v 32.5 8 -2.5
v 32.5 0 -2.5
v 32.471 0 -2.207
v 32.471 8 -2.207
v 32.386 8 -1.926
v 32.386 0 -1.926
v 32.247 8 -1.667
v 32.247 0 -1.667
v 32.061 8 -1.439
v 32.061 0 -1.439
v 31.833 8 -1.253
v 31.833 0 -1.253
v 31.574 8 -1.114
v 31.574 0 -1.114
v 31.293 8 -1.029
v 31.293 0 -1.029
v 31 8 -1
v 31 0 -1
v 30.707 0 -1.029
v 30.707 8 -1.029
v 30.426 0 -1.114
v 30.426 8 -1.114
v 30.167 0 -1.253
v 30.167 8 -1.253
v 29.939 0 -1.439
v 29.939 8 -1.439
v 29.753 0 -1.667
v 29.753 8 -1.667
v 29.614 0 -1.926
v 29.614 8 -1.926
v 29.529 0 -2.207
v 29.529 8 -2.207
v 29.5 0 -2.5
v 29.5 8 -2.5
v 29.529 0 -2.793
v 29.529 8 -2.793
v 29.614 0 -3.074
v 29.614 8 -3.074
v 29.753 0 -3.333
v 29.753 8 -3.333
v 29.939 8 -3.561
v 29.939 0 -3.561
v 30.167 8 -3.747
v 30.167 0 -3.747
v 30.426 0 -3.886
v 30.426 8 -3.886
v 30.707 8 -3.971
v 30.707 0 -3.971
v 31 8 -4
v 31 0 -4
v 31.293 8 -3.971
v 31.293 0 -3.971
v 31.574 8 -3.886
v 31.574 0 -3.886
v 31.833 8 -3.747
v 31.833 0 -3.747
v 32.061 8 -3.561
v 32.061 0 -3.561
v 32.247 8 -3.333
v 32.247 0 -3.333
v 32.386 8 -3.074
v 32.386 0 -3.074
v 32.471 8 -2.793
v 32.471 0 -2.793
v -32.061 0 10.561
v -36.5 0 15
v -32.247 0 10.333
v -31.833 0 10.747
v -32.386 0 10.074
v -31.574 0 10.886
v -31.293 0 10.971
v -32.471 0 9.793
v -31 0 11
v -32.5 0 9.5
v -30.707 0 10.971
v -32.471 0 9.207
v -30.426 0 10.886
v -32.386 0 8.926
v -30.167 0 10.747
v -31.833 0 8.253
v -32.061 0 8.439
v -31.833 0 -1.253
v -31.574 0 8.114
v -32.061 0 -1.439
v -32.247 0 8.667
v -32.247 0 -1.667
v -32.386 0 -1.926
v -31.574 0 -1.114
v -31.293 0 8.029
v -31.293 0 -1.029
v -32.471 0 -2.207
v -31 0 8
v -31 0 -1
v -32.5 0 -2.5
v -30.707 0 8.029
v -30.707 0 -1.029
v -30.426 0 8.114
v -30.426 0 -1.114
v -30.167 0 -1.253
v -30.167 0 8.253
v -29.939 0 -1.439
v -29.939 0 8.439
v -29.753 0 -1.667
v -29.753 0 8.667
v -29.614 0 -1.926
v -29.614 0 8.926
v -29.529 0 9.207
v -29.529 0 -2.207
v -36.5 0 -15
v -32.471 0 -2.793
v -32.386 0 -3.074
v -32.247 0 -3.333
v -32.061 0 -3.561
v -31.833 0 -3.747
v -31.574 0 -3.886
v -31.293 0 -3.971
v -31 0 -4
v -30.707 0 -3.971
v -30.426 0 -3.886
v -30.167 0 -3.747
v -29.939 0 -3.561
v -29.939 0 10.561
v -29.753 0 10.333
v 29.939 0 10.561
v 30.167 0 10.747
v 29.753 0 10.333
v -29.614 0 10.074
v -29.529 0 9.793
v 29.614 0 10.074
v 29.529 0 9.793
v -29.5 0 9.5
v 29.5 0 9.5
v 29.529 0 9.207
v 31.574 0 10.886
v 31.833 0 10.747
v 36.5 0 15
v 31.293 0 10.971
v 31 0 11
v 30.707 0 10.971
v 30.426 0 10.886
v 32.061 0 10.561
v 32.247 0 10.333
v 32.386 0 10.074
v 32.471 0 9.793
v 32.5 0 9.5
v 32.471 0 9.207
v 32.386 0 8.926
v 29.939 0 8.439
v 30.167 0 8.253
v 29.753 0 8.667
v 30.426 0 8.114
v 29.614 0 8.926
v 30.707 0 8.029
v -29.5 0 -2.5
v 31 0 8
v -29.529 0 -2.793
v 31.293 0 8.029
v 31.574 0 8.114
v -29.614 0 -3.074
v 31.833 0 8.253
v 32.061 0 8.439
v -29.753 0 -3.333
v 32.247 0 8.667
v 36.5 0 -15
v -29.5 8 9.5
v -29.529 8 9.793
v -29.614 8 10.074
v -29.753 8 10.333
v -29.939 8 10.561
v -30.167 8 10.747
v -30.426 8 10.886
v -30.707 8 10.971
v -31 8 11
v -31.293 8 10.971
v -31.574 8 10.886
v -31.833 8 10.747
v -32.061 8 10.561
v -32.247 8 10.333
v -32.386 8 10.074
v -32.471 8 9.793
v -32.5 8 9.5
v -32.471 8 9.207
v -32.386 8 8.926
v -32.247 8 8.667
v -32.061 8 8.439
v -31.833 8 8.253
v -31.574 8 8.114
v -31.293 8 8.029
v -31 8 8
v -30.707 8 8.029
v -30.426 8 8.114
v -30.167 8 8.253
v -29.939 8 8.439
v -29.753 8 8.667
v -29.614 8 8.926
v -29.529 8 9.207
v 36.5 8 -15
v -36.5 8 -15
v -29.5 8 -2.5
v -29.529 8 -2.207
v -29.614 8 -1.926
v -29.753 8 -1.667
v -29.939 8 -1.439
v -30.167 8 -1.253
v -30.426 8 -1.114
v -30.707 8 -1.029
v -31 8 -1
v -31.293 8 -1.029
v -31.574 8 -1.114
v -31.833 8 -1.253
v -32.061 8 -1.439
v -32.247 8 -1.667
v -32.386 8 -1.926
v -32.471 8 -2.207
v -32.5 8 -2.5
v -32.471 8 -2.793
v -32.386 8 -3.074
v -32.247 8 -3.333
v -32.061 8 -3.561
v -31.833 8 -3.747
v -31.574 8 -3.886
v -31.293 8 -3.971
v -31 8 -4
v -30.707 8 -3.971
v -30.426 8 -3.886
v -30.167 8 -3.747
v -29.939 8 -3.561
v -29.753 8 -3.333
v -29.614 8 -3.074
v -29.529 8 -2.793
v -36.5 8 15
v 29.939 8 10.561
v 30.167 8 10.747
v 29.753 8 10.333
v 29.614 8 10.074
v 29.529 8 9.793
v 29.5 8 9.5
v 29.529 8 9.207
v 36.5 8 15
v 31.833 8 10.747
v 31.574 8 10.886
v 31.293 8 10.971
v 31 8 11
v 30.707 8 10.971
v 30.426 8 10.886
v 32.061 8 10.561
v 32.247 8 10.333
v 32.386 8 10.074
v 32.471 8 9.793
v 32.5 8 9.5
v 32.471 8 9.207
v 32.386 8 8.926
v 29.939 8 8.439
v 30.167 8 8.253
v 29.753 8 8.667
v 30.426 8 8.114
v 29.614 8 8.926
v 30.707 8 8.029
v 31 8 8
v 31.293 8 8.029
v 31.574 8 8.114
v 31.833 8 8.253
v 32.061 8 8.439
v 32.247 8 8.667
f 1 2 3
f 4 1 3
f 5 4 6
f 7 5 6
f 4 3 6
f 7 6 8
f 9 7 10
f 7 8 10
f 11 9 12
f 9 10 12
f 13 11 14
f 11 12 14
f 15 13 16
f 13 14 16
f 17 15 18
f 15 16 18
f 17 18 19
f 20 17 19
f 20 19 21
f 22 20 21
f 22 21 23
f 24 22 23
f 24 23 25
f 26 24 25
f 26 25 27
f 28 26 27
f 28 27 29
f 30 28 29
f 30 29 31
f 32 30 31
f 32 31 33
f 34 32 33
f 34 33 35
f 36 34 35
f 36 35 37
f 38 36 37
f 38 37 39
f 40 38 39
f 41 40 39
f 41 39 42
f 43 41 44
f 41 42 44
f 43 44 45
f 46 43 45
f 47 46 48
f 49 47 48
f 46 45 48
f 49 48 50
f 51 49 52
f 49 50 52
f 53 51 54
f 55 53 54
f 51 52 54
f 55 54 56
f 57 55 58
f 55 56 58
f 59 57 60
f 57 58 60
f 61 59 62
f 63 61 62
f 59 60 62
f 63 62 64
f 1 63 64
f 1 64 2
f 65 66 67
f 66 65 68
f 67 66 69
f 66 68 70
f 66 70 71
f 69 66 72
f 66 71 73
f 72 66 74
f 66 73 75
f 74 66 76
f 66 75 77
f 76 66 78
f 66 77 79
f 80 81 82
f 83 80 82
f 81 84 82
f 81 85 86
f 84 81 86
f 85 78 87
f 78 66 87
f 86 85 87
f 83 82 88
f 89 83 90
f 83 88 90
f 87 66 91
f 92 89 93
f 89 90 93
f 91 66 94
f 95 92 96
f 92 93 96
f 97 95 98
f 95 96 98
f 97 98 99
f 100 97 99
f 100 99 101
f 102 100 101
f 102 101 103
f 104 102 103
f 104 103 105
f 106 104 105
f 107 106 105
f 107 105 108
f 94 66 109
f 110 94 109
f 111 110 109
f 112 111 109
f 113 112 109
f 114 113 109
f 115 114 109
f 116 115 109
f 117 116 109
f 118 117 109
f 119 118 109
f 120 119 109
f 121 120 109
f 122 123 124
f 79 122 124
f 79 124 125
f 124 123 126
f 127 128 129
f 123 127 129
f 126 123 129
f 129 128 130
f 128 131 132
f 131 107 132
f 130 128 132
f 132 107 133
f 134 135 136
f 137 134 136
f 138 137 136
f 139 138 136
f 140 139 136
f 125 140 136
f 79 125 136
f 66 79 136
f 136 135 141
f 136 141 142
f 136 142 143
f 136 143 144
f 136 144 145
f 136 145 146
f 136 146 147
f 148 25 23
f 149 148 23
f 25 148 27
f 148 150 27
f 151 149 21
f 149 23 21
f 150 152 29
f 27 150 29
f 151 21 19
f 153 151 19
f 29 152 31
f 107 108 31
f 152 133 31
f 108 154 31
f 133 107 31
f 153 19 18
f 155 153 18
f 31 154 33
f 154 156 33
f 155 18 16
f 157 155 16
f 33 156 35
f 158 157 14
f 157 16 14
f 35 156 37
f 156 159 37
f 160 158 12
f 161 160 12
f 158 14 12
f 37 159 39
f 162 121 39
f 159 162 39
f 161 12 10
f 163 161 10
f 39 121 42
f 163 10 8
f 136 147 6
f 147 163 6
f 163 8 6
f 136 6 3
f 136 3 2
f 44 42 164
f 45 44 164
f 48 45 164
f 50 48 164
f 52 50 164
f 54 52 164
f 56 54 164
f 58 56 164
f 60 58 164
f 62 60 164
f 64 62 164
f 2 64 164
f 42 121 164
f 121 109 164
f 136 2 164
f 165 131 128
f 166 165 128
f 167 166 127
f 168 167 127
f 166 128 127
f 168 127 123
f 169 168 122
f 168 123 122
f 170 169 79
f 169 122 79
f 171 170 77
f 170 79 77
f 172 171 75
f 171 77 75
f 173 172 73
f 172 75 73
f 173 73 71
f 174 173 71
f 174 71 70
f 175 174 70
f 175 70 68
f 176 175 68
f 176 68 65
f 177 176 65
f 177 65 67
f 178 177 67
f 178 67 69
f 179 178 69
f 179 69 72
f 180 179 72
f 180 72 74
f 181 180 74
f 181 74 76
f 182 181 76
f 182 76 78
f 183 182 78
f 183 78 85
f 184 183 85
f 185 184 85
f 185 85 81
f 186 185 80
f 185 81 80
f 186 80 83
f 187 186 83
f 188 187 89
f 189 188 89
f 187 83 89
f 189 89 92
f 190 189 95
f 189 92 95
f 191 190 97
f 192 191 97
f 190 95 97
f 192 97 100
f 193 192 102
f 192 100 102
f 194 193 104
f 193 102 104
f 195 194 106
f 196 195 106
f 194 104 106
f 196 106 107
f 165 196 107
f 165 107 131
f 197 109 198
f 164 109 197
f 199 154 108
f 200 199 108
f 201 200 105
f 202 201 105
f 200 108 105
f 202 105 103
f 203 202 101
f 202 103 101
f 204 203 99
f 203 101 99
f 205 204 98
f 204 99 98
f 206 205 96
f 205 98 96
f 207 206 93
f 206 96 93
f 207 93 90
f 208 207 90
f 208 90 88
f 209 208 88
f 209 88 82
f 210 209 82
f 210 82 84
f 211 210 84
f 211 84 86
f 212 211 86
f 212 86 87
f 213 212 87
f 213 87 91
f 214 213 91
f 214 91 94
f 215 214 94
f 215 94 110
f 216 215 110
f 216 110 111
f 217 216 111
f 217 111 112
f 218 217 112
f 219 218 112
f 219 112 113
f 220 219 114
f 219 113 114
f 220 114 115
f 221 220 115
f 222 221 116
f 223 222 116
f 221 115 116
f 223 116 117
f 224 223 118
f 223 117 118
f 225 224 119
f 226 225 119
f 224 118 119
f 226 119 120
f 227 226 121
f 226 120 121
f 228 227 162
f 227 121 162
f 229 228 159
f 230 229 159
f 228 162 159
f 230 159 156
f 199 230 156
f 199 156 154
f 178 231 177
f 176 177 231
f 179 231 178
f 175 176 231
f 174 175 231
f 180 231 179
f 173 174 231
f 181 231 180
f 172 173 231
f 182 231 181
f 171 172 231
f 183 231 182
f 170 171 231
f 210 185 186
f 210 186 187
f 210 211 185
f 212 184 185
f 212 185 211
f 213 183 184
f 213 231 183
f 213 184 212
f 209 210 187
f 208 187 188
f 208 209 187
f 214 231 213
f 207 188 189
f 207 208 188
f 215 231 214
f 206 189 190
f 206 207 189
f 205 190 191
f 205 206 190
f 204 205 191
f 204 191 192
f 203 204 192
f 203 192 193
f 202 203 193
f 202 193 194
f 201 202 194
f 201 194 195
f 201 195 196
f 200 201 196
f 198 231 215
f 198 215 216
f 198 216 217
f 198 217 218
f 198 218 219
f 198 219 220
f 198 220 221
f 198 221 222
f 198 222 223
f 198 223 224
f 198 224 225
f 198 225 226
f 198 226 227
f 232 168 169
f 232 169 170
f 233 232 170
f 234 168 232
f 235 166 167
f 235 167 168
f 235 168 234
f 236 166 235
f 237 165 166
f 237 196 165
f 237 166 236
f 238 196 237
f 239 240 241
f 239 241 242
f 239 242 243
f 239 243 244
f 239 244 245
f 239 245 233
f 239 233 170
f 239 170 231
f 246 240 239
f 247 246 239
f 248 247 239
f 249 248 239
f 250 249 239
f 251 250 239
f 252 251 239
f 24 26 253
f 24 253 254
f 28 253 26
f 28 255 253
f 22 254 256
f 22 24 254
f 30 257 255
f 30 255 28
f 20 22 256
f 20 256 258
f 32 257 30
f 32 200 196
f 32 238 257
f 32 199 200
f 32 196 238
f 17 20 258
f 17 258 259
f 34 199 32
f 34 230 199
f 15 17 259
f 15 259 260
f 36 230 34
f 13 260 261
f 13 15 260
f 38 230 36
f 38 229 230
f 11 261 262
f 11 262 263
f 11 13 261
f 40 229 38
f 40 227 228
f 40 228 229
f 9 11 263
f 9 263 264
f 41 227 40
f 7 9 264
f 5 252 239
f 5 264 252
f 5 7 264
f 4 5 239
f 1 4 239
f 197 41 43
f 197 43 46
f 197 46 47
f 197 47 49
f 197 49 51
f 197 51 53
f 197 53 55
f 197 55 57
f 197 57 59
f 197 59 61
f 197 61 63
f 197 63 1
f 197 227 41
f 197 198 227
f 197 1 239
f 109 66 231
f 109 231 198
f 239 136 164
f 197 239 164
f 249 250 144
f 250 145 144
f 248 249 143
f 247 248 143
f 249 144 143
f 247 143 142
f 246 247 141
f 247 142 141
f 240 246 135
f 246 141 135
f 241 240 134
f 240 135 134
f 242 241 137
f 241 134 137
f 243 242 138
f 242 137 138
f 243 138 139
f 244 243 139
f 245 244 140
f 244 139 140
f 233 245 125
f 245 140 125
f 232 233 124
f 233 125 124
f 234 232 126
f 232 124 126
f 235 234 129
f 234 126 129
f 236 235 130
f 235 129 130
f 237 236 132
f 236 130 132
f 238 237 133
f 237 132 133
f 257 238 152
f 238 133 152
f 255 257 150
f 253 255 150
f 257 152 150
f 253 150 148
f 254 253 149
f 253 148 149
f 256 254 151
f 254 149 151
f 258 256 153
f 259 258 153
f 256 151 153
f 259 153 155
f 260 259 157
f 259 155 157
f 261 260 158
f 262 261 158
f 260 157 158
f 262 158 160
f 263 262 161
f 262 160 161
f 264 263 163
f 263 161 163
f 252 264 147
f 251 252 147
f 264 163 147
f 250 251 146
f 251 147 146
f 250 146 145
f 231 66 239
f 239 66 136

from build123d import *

# Parameters (mm, degrees)
SKETCH_1_W          = 73
SKETCH_1_H          = 30
EXTRUDE_1_DEPTH     = 8
SKETCH_2_R          = 1.5
CUT_EXTRUDE_1_DEPTH = 45


with BuildPart() as part:
    # 草图1 → 凸台-拉伸1 (new body)
    with BuildSketch(Plane(origin=(0, 0, 0), x_dir=(1, 0, 0), z_dir=(0, 1, 0))):
        Rectangle(SKETCH_1_W, SKETCH_1_H)
    extrude(amount=EXTRUDE_1_DEPTH)

    # 草图2 → 切除-拉伸1 (cut, symmetric)
    with BuildSketch(Plane(origin=(59.282070169, -28, -16.5), x_dir=(1, 0, 0), z_dir=(0, -1, 0))):
        with Locations((-28.282070169, 14)):
            Circle(SKETCH_2_R)
        with Locations((-90.282070169, 14)):
            Circle(SKETCH_2_R)
        with Locations((-90.282070169, 26)):
            Circle(SKETCH_2_R)
        with Locations((-28.282070169, 26)):
            Circle(SKETCH_2_R)
    extrude(amount=CUT_EXTRUDE_1_DEPTH, both=True, mode=Mode.SUBTRACT)


solid = part.part
